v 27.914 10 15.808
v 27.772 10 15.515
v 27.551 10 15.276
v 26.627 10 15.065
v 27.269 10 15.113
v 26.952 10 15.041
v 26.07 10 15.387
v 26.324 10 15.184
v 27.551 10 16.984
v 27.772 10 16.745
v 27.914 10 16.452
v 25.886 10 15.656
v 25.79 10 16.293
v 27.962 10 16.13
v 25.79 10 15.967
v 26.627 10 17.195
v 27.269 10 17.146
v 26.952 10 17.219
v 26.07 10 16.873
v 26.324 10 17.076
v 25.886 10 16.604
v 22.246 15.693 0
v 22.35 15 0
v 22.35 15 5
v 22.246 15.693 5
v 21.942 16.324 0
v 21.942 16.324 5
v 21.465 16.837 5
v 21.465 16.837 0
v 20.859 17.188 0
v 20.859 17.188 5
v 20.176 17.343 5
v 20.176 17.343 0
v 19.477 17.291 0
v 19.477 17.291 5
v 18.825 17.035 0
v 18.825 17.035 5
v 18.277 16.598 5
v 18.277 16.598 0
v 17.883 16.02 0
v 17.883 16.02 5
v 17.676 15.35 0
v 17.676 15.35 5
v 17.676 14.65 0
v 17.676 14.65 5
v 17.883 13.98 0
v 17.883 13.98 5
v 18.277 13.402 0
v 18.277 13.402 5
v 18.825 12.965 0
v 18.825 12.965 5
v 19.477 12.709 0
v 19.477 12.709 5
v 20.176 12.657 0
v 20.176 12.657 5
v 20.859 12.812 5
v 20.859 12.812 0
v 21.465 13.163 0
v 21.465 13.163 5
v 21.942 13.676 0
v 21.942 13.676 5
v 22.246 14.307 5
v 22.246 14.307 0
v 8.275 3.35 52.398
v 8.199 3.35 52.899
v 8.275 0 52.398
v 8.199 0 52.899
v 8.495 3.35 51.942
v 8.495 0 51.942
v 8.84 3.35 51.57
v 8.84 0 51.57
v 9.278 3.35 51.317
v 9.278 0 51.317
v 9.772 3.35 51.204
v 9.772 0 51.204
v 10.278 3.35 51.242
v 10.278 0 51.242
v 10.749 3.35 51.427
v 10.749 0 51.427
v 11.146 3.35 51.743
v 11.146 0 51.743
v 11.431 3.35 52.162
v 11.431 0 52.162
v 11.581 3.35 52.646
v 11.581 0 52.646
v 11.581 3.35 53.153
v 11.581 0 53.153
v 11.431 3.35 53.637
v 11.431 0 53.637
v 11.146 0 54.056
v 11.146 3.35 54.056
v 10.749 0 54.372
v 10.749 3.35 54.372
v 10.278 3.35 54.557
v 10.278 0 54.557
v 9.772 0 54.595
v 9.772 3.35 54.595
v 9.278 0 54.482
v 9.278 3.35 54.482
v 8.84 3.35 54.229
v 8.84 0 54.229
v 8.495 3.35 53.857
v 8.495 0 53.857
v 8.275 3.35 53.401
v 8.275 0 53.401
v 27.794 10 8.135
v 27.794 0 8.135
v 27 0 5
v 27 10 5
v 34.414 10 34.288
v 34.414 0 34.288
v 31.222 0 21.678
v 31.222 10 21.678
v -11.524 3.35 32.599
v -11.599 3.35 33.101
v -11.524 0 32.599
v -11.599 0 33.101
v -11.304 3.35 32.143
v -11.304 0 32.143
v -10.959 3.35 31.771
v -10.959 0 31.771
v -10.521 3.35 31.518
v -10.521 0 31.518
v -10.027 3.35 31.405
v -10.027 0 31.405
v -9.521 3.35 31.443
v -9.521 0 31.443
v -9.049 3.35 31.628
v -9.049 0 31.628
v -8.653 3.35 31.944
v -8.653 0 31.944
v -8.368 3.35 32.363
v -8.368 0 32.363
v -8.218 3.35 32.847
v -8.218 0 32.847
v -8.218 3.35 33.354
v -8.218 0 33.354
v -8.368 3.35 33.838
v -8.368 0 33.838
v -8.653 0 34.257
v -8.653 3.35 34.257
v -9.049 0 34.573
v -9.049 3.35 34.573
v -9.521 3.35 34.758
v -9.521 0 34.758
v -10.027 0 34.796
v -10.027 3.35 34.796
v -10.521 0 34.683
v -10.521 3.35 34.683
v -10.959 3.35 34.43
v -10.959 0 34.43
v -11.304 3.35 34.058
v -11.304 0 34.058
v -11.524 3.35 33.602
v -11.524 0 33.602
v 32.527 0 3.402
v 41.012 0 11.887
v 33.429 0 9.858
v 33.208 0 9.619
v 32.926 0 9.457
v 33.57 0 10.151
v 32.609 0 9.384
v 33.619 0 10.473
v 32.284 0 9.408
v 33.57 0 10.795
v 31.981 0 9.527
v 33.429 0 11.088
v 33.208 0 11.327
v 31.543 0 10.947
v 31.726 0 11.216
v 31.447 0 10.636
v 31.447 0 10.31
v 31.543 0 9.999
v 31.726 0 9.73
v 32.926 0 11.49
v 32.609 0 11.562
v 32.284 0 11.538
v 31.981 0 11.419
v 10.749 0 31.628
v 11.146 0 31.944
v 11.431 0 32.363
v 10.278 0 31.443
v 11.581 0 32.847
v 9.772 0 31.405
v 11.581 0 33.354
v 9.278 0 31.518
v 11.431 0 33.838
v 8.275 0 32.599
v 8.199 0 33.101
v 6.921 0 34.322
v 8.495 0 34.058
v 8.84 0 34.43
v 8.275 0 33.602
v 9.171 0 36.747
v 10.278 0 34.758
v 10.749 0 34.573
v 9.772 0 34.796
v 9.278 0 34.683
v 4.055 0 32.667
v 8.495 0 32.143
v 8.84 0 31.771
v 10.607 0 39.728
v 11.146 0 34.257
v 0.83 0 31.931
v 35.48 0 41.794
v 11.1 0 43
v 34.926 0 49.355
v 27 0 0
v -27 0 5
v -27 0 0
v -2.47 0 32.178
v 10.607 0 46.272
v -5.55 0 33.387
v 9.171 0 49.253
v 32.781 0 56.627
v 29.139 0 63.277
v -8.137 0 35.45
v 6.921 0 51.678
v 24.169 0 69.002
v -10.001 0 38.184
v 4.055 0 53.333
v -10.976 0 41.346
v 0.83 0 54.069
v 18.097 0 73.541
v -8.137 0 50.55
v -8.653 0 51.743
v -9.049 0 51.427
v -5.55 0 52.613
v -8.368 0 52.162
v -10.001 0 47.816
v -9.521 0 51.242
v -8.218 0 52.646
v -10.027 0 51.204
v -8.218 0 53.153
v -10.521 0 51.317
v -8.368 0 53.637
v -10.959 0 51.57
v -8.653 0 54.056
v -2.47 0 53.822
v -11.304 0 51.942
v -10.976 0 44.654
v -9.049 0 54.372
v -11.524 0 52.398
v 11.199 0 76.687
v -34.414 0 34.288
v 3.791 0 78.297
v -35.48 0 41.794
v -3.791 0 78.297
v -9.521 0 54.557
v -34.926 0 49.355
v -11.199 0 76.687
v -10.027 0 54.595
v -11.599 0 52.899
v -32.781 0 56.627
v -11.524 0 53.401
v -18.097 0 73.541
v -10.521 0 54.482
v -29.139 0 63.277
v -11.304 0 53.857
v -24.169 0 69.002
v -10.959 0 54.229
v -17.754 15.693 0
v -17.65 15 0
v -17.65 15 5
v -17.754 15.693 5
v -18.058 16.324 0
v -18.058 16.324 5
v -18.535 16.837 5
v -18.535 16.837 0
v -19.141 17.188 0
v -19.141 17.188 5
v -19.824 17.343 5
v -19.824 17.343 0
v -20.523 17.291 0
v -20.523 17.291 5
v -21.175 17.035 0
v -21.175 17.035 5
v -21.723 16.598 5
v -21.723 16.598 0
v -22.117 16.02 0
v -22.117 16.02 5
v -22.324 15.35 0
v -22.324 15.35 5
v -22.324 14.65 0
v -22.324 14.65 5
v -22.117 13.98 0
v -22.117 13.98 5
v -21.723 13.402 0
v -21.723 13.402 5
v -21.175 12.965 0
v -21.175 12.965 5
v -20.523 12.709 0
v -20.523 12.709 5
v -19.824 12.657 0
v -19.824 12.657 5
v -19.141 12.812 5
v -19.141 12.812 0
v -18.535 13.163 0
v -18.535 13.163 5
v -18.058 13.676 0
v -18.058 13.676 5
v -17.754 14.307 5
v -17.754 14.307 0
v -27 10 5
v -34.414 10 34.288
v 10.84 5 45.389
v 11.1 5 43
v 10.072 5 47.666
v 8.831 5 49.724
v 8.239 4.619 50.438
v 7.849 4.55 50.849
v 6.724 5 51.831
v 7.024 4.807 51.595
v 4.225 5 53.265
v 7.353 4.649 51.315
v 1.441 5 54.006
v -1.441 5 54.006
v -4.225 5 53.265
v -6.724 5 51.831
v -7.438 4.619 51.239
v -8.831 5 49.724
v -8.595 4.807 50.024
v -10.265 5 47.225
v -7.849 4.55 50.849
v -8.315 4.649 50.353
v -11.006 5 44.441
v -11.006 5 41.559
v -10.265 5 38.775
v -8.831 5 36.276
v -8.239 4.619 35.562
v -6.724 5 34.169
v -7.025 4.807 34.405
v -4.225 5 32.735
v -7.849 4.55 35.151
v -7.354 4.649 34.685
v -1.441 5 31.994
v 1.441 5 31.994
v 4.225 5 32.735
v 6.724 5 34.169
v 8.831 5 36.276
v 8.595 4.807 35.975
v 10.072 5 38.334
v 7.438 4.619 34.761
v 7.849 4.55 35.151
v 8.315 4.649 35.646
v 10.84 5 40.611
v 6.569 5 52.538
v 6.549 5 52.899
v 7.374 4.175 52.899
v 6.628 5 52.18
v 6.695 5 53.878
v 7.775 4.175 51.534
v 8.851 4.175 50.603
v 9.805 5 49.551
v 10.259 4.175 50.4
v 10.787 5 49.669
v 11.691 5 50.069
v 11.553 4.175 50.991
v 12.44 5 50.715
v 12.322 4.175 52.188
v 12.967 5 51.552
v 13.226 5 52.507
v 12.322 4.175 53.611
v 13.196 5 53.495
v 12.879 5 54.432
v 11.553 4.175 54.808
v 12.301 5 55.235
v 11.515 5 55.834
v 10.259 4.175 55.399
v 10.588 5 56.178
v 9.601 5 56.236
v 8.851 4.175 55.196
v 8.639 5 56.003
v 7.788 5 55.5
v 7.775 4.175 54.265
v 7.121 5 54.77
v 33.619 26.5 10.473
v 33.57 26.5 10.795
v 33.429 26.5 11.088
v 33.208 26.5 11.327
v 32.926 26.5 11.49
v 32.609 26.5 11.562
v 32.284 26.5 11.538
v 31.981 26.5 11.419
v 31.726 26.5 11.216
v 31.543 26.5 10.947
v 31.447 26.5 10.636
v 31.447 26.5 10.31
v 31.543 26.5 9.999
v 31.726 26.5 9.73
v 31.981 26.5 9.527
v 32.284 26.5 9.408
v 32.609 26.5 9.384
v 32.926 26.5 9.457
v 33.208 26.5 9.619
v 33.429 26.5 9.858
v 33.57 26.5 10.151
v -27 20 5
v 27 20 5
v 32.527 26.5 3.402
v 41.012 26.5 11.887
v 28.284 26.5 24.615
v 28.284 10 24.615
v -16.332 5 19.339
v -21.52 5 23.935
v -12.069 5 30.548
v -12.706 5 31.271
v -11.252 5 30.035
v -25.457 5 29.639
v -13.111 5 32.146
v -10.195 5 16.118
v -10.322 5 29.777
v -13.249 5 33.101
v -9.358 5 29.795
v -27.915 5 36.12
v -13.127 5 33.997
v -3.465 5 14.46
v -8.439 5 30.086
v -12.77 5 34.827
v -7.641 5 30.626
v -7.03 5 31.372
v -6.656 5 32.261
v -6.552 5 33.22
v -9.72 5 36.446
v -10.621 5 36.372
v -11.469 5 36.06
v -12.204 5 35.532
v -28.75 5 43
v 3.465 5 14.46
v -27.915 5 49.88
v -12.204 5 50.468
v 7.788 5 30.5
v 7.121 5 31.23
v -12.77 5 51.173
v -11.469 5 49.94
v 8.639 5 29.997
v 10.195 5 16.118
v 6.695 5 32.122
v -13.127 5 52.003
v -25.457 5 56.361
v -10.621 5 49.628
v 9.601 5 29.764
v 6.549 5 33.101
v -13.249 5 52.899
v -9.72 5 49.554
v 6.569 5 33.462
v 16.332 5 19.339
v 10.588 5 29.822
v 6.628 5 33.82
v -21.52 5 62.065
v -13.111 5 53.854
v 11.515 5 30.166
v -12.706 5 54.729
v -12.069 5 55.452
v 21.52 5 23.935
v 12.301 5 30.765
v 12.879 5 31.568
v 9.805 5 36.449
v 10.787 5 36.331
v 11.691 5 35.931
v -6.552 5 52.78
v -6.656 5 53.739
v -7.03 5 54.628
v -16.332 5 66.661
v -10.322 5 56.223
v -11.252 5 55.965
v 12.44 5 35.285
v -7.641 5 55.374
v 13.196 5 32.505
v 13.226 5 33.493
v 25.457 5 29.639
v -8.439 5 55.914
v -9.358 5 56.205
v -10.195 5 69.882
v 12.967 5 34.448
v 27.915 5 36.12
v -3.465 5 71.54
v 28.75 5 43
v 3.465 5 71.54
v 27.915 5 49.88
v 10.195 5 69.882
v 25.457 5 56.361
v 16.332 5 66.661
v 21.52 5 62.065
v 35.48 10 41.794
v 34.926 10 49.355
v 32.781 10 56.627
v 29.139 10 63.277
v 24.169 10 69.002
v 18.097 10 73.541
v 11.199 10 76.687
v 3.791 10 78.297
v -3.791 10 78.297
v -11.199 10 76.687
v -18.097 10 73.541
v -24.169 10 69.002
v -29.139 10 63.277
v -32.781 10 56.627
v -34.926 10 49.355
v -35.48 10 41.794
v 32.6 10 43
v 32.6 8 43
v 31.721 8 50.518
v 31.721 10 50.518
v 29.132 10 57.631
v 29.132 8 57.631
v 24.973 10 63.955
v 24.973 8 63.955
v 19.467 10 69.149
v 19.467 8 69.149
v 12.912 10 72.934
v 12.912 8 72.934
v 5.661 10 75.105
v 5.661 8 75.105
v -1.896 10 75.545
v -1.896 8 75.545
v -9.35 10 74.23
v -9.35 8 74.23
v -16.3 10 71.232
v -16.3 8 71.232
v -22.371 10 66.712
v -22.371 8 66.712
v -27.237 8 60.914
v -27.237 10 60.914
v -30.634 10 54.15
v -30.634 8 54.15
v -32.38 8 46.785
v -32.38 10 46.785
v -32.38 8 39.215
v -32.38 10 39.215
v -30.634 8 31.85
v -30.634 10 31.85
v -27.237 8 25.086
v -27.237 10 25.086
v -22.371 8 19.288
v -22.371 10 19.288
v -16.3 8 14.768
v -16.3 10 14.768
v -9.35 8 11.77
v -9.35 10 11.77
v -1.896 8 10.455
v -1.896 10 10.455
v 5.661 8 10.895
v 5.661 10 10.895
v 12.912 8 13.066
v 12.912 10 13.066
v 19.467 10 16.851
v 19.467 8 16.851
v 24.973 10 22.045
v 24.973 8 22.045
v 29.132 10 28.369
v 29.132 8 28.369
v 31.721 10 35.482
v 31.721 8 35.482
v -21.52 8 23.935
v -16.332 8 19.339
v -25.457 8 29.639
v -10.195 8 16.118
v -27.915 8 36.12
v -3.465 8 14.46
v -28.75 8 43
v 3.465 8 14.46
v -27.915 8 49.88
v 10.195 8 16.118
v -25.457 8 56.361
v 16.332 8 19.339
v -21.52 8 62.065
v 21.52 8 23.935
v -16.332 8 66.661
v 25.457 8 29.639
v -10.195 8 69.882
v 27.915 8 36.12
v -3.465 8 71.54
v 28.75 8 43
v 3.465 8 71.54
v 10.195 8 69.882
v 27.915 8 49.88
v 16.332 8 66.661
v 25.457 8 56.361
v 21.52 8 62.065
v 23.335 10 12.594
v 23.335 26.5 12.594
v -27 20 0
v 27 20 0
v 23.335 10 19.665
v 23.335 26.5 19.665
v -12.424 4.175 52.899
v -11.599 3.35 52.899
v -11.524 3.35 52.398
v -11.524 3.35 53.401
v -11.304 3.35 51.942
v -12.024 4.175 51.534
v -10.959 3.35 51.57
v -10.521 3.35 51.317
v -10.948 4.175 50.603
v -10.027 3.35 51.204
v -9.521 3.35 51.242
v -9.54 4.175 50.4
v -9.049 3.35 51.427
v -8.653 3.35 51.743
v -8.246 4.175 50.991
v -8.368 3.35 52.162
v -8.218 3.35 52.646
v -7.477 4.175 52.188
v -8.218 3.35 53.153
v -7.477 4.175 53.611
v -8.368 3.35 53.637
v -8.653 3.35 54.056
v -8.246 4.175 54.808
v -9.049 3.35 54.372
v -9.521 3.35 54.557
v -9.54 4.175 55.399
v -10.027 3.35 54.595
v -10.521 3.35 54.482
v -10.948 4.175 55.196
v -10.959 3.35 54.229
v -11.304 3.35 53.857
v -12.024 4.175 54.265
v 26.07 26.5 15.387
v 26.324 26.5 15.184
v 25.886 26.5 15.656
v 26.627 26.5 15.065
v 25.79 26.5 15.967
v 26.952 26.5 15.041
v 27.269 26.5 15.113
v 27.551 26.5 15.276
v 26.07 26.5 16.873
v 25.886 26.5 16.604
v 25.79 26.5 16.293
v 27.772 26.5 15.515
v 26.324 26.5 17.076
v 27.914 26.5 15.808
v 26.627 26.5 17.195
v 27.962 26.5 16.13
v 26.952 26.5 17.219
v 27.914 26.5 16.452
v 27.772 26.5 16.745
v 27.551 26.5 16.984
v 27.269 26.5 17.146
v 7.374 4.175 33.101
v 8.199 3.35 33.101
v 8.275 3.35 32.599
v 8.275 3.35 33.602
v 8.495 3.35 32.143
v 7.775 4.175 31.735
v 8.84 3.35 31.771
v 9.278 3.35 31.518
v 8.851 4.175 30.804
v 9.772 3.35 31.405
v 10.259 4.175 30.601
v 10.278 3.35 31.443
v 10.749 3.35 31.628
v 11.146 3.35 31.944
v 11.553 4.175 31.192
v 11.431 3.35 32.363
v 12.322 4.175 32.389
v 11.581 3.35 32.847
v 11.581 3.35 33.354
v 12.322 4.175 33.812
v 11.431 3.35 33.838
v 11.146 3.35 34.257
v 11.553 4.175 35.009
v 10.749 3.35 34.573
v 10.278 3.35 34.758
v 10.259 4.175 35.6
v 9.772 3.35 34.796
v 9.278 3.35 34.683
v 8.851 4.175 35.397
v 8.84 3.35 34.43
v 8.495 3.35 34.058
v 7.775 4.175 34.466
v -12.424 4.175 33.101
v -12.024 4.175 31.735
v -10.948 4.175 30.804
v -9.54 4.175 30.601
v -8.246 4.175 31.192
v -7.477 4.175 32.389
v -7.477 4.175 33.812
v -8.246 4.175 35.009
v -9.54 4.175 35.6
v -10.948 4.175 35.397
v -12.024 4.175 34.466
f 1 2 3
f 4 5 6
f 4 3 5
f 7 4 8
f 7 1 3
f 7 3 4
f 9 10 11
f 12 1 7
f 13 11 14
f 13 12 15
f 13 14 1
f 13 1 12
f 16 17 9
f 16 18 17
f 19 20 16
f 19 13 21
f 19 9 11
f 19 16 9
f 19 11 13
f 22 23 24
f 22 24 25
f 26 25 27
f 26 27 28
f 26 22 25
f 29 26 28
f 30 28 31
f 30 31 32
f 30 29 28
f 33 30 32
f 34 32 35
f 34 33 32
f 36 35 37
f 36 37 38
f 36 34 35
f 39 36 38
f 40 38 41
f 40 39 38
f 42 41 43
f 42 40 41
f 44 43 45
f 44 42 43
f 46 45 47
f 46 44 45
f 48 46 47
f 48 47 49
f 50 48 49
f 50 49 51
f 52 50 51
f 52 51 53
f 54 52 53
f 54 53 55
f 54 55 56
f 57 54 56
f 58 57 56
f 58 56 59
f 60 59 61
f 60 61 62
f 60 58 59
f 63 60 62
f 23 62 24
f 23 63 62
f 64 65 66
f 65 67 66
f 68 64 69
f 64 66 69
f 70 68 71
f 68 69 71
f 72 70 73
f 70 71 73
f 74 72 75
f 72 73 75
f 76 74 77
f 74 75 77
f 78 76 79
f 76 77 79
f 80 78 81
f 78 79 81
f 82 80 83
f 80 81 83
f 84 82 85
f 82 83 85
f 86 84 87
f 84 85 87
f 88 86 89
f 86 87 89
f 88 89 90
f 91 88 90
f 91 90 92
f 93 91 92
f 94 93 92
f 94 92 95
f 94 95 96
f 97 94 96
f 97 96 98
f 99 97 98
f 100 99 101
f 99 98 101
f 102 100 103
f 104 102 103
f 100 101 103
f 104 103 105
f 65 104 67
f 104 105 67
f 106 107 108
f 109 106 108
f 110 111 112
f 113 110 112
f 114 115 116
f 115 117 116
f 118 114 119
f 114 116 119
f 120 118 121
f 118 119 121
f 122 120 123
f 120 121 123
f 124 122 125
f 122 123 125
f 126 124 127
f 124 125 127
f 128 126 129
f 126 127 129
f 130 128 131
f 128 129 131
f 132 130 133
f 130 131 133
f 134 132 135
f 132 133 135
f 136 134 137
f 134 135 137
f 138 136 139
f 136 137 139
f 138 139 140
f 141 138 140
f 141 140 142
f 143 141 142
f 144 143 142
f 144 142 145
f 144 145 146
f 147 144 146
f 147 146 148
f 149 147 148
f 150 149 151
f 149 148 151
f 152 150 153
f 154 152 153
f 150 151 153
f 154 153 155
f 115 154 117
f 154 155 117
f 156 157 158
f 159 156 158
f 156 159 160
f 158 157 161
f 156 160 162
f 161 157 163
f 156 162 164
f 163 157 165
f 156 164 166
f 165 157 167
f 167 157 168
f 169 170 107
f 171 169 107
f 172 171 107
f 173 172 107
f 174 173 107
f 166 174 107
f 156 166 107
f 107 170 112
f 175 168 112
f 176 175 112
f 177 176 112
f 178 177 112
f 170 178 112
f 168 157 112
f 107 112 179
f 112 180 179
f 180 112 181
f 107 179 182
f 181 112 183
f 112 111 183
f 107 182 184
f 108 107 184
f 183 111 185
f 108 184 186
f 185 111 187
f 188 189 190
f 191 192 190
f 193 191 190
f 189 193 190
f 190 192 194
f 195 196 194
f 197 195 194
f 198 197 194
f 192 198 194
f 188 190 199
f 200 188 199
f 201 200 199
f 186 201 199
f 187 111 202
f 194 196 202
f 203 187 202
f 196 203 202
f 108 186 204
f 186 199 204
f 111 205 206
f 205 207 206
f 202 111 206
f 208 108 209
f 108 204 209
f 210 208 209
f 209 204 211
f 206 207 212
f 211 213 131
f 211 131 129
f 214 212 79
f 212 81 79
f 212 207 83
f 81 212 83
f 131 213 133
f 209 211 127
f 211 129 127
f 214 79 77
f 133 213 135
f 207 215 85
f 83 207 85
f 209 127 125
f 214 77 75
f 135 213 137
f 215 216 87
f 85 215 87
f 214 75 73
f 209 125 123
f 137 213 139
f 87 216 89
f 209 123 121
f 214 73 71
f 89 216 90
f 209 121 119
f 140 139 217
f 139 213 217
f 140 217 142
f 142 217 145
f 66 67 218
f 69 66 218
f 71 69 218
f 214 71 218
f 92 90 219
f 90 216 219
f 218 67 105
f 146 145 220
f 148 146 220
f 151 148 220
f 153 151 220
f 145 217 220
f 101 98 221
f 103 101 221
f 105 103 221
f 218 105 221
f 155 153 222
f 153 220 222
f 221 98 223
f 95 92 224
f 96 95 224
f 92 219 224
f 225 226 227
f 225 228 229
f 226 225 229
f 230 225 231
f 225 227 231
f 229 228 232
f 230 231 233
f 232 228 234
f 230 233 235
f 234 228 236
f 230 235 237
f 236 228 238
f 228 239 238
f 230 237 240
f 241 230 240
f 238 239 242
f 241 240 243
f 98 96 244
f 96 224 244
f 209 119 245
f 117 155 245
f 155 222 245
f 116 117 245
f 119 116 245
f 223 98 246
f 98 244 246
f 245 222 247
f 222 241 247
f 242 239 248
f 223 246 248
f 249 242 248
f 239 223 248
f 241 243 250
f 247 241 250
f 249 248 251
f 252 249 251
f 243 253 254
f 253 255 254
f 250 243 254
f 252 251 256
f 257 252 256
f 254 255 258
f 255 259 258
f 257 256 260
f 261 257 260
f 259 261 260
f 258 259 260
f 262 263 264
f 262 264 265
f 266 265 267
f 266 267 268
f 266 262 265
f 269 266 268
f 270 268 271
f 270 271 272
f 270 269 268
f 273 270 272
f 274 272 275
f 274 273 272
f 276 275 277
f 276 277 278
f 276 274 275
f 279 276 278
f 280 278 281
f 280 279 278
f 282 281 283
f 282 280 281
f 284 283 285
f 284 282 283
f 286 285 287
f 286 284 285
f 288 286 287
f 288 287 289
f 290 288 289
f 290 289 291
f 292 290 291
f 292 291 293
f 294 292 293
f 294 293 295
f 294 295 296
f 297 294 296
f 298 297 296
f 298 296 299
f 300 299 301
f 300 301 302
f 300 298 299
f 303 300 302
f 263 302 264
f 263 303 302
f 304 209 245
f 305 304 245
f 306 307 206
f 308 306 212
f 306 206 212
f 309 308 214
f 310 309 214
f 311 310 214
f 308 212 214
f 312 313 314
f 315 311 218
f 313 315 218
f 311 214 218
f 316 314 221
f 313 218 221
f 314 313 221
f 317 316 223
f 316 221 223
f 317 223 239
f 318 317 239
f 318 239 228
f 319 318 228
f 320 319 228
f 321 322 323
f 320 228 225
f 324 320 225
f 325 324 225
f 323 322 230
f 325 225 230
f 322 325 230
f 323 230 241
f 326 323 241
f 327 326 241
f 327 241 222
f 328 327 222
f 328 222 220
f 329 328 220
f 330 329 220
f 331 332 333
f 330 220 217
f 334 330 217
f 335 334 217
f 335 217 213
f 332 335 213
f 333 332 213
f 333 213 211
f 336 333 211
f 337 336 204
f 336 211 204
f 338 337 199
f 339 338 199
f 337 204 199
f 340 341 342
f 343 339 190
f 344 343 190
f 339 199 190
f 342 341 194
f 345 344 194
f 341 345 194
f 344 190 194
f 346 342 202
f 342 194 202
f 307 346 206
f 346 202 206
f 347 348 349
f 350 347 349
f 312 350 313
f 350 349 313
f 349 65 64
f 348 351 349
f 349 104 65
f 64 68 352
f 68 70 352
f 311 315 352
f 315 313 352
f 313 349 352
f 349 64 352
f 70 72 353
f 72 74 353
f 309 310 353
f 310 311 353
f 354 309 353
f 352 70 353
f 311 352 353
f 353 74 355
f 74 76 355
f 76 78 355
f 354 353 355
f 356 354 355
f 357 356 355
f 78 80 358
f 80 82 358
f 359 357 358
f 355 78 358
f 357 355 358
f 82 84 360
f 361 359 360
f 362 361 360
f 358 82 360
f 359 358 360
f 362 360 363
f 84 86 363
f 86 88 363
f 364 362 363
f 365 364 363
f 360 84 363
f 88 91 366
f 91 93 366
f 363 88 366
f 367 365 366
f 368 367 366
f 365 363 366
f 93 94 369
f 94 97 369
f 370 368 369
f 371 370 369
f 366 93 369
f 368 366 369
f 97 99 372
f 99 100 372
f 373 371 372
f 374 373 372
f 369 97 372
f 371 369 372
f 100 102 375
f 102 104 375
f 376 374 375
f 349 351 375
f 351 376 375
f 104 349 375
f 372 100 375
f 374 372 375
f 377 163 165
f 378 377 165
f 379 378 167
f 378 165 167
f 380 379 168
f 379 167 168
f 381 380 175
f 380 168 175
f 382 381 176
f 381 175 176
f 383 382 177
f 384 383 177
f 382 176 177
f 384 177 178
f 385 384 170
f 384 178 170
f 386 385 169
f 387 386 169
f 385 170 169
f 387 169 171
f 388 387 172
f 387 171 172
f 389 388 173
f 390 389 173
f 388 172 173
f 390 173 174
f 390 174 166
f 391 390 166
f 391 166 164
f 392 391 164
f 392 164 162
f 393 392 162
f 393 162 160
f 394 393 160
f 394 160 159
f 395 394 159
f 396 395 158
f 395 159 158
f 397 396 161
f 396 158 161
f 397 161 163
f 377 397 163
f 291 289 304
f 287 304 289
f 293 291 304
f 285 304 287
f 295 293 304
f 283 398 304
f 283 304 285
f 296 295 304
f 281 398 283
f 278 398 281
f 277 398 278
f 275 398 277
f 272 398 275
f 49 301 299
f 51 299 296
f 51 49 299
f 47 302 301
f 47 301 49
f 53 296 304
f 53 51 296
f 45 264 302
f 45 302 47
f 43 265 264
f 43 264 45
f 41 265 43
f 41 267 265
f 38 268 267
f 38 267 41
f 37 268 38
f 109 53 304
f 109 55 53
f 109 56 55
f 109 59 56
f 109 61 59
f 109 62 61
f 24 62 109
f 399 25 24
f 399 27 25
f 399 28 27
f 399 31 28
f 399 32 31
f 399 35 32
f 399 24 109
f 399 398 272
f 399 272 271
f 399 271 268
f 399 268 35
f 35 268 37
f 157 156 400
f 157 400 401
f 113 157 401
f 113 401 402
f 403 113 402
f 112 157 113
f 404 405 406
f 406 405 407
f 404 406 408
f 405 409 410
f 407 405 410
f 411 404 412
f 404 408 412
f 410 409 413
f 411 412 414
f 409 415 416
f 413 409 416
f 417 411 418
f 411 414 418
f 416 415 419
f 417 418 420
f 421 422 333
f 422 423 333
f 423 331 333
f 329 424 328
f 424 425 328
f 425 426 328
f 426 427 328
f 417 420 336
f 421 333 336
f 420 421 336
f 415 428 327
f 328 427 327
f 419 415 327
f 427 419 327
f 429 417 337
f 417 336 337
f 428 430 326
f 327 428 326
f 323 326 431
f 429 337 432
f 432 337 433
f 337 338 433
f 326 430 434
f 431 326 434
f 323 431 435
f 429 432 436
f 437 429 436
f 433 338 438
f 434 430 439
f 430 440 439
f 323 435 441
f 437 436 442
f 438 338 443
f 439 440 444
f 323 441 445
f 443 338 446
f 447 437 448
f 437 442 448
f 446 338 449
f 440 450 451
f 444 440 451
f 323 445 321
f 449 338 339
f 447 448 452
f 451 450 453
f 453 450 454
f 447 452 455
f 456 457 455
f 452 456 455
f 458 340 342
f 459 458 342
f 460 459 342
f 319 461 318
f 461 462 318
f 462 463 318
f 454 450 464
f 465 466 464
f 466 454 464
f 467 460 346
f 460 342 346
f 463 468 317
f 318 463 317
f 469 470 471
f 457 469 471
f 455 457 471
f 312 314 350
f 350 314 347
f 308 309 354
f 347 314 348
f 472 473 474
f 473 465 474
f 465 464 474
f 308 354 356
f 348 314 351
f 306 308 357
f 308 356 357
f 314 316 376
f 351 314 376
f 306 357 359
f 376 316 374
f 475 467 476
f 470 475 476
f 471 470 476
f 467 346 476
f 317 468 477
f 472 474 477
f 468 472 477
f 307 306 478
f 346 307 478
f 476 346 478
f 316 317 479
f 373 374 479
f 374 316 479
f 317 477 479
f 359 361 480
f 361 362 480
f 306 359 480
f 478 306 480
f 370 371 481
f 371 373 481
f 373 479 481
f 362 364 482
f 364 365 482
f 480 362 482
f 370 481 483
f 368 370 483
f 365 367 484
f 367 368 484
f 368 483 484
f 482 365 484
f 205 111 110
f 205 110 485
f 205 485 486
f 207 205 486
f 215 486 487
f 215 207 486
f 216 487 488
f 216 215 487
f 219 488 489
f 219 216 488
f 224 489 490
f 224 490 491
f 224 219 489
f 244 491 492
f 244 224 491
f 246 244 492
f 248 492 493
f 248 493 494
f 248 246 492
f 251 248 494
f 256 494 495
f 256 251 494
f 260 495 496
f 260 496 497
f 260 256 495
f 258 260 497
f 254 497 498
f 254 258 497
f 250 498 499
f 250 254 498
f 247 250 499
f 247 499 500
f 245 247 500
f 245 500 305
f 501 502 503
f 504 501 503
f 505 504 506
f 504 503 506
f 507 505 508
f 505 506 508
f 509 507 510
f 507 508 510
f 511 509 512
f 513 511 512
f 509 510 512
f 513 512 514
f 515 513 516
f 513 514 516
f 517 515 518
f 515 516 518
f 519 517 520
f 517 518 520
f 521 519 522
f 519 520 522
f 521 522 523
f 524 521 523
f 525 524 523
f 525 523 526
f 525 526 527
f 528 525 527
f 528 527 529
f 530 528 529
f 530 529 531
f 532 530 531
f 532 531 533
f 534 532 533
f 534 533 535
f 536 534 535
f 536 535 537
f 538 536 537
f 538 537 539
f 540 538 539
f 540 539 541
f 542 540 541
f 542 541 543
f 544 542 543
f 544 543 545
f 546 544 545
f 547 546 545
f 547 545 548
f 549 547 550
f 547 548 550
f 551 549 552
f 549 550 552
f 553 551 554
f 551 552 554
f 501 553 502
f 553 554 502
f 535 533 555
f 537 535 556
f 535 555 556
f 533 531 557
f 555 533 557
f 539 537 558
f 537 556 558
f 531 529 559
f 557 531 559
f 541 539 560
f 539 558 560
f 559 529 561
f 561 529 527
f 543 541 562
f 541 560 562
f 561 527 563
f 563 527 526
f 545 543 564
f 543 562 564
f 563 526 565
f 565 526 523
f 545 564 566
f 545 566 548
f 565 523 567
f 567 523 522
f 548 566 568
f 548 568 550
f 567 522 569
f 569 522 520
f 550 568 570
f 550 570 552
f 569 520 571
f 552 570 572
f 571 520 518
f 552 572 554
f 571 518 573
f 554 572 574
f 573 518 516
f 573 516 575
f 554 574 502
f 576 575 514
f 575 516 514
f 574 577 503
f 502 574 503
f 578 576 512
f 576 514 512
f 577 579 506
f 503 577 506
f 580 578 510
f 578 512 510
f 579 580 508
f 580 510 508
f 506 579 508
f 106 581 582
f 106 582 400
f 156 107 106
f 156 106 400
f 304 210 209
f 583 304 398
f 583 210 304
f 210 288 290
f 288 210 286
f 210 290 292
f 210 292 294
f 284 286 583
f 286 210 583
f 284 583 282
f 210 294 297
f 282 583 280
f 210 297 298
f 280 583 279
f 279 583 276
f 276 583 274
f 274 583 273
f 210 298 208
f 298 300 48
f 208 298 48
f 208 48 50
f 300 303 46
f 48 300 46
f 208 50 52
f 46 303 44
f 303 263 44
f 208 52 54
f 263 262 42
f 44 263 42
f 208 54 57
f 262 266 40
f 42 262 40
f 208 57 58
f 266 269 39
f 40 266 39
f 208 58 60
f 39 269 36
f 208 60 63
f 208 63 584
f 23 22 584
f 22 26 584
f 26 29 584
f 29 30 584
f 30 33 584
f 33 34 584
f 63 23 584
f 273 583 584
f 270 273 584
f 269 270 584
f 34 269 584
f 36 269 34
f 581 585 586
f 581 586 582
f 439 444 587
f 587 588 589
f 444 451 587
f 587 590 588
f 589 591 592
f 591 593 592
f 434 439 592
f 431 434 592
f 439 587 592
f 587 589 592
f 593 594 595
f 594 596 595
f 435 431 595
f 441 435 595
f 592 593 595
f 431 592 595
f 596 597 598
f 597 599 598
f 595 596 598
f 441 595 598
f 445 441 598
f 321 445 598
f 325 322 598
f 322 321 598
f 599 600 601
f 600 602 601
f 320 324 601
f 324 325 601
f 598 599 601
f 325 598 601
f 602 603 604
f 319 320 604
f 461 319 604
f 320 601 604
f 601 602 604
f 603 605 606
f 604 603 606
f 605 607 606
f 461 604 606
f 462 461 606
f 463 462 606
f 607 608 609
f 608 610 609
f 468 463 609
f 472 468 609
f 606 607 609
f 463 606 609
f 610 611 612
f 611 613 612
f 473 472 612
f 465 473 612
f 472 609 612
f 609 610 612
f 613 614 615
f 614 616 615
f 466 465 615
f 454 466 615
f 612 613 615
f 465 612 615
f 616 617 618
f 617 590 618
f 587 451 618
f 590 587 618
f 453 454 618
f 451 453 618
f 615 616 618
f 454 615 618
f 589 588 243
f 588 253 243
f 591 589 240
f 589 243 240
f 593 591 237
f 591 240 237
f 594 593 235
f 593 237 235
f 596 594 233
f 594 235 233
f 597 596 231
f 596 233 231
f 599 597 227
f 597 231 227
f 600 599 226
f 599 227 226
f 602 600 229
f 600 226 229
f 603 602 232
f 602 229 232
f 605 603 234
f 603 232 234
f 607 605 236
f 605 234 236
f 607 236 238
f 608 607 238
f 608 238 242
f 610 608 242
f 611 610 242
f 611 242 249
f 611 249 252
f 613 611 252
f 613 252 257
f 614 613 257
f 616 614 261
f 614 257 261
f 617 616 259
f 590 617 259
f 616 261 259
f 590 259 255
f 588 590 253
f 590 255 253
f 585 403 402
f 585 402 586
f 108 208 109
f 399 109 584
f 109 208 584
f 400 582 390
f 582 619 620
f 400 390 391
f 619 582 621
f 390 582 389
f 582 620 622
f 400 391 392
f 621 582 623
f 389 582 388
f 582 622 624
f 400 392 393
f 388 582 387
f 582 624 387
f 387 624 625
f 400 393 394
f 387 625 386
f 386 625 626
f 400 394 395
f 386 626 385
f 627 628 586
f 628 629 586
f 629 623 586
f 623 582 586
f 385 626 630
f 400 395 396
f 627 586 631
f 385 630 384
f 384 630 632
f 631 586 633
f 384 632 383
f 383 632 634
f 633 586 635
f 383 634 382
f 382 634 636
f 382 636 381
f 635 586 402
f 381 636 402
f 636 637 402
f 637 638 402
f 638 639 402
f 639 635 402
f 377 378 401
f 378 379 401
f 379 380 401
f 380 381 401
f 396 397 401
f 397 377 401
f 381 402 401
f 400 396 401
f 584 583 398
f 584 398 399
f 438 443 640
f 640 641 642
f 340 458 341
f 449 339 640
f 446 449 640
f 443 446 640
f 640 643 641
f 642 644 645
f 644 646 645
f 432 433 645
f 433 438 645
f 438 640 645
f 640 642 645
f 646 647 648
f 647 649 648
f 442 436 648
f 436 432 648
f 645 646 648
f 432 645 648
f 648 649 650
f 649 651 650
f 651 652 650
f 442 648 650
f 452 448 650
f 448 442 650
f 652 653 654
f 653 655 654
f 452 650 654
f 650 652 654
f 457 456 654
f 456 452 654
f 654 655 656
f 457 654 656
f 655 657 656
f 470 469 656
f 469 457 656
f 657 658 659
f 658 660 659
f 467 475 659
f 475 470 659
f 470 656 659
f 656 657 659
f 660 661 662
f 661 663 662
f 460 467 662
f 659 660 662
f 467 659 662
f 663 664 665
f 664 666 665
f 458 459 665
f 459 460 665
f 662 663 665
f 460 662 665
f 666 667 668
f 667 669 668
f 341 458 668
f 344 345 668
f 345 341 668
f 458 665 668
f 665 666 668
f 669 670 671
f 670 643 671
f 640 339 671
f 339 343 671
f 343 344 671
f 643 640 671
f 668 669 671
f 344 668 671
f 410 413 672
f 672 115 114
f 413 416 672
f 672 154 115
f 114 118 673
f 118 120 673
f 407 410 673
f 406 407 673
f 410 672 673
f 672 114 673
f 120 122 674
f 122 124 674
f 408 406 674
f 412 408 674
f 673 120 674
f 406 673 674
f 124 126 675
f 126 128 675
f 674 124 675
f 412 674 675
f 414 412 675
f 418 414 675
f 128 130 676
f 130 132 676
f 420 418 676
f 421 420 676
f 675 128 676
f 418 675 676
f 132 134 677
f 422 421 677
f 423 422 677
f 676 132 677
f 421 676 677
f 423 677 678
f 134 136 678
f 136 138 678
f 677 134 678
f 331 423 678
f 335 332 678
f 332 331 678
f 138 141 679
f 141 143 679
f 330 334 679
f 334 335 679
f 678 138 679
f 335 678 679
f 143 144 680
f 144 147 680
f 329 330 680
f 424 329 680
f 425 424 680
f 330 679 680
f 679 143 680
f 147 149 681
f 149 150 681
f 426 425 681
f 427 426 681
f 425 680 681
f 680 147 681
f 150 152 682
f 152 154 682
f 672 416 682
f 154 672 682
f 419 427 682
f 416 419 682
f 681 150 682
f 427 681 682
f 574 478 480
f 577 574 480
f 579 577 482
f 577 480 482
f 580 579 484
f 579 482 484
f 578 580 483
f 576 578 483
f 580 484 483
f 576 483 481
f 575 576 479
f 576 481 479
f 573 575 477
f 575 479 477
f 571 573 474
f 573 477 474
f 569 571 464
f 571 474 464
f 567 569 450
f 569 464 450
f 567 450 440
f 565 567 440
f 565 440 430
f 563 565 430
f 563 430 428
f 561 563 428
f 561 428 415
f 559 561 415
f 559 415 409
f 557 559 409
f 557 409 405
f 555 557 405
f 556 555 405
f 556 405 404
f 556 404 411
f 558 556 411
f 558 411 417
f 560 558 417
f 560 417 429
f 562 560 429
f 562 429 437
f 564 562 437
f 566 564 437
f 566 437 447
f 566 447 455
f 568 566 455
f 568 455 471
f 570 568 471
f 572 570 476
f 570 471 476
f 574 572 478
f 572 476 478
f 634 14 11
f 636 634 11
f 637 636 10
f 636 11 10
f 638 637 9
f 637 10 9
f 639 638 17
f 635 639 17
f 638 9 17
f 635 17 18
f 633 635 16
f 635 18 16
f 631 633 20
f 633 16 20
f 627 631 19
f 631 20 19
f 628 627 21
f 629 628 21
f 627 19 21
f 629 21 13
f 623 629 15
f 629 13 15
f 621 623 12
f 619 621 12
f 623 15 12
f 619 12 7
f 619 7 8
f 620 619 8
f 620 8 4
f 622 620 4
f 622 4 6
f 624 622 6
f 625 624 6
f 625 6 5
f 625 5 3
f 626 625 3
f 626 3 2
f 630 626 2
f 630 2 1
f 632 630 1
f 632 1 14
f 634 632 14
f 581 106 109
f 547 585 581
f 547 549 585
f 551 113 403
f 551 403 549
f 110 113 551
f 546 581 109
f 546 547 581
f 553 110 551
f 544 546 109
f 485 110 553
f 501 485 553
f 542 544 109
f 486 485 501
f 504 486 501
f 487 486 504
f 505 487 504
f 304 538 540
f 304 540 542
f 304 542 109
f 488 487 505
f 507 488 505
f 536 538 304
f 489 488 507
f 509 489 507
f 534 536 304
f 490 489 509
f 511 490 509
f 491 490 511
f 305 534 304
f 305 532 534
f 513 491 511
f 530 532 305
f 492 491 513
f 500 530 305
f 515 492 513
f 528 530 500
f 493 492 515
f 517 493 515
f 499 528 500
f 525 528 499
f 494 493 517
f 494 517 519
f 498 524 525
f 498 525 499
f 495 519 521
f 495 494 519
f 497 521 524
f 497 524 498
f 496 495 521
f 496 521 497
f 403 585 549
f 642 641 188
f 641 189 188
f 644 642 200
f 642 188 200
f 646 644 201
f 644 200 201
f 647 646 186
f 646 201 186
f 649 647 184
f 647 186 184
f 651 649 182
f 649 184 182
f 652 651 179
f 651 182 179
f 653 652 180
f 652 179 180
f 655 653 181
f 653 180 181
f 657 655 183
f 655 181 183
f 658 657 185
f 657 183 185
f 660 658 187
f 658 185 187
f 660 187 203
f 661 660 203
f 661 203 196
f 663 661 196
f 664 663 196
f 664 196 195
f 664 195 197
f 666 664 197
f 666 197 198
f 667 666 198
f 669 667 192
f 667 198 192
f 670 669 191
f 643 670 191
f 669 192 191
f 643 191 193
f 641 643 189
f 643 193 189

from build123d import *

# Parameters (mm, degrees)
SKETCH016_W         = 54
SKETCH016_H         = 20
SKETCH016_R         = 2.35
PAD010_DEPTH        = 5
SKETCH019_R         = 11.1
SKETCH019_R_2       = 1.65
PAD009_DEPTH        = 10
SKETCH017_R         = 32.6
POCKET006_DEPTH     = 15.001
SKETCH076_R         = 32.6
SKETCH076_R_2       = 28.75
PAD049_DEPTH        = 4
SKETCH090_R         = 1.092
PAD055_DEPTH        = 26.5
HOLE009_D           = 3.4
HOLE009_CSINK_D     = 6.7
HOLE009_CSINK_ANGLE = 90


with BuildPart() as part:
    # Sketch016 → Pad010 (new body)
    with BuildSketch(Plane.XY):
        with Locations((0, 10)):
            Rectangle(SKETCH016_W, SKETCH016_H)
        with Locations((-20, 15)):
            Circle(SKETCH016_R, mode=Mode.SUBTRACT)
        with Locations((20, 15)):
            Circle(SKETCH016_R, mode=Mode.SUBTRACT)
    extrude(amount=PAD010_DEPTH)

    # Sketch019 → Pad009 (join)
    with BuildSketch(Plane.XZ):
        with BuildLine():
            Line((-27, 5), (-34.41436, 34.287835))
            ThreePointArc((34.41436, 34.287835), (0, 78.5), (-34.41436, 34.287835))
            Line((34.41436, 34.287835), (27, 5))
            Line((-27, 5), (27, 5))
        make_face()
        with Locations((0, 43)):
            Circle(SKETCH019_R, mode=Mode.SUBTRACT)
        with Locations((9.899495, 52.899495)):
            Circle(SKETCH019_R_2, mode=Mode.SUBTRACT)
        with Locations((-9.899495, 52.899495)):
            Circle(SKETCH019_R_2, mode=Mode.SUBTRACT)
        with Locations((9.899495, 33.100505)):
            Circle(SKETCH019_R_2, mode=Mode.SUBTRACT)
        with Locations((-9.899495, 33.100505)):
            Circle(SKETCH019_R_2, mode=Mode.SUBTRACT)
    extrude(amount=-PAD009_DEPTH)

    # Sketch017 → Pocket006 (cut, through all)
    with BuildSketch(Plane.XZ.offset(-5)):
        with Locations((0, 43)):
            Circle(SKETCH017_R)
    extrude(amount=-POCKET006_DEPTH, mode=Mode.SUBTRACT)

    # Sketch076 → Pad049 (join)
    with BuildSketch(Plane.XZ.offset(-4)):
        with Locations((0, 43)):
            Circle(SKETCH076_R)
        with Locations((0, 43)):
            Circle(SKETCH076_R_2, mode=Mode.SUBTRACT)
    extrude(amount=-PAD049_DEPTH)

    # Sketch090 → Pad055 (join)
    with BuildSketch(Plane.XZ):
        Polygon((28.284271, 24.615224), (23.334524, 19.665476), (23.334524, 12.594408), (32.526912, 3.40202), (41.012193, 11.887302), align=None)
        with Locations((32.526912, 10.473088)):
            Circle(SKETCH090_R, mode=Mode.SUBTRACT)
        with Locations((26.870058, 16.129942)):
            Circle(SKETCH090_R, mode=Mode.SUBTRACT)
    extrude(amount=-PAD055_DEPTH)

    # Hole009 (through all)
    with Locations(Plane(origin=(0, 5, 0), x_dir=(1, 0, 0), z_dir=(0, 1, 0))):
        with Locations((-9.899495, -52.899495), (9.899495, -52.899495), (9.899495, -33.100505), (-9.899495, -33.100505)):
            CounterSinkHole(HOLE009_D / 2, HOLE009_CSINK_D / 2, counter_sink_angle=HOLE009_CSINK_ANGLE)


solid = part.part
